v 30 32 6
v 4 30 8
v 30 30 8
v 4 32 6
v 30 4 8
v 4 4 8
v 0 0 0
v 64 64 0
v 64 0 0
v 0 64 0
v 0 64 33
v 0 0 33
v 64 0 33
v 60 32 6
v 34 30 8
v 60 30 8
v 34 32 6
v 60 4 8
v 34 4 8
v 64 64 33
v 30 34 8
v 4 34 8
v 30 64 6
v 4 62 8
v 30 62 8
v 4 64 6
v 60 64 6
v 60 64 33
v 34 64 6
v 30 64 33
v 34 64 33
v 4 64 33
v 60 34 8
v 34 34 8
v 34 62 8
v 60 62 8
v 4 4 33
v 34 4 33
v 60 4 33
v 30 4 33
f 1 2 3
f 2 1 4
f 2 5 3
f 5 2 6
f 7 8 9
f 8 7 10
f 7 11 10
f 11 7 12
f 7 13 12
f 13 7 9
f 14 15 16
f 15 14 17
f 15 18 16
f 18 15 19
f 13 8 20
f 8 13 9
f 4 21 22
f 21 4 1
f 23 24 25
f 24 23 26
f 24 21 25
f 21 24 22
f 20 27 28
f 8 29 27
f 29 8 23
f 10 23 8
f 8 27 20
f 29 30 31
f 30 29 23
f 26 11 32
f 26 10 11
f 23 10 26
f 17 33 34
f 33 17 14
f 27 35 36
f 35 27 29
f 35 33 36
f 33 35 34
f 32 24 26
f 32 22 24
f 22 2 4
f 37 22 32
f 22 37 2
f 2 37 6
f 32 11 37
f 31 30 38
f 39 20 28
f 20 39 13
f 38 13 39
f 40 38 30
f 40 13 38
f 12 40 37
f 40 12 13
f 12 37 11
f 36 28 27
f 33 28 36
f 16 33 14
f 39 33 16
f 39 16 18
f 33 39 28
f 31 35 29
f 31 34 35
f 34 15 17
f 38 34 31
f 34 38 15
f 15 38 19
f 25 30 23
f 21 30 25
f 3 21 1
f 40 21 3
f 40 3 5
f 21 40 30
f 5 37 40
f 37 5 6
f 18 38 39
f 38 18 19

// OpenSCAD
// file: WylochStyleDungeonLibrary.scad
size = 32;
baseheight = 6;
topperheight = 2;
topperrounded = true;
walllength = size;
wallheight = 25 + baseheight + topperheight;
wallwidth = 6;
wallwidththin = 4;

function hypotenuse_ra(side_a, side_b) =
    sqrt(pow(side_a, 2) + pow(side_b, 2));
    
module wsdl_Base(s,bh)
{
    cube([s,s,bh]);
}

module wsdl_Topper(s,bh,th,tr)
{
    if (tr) {
        translate([0,0,bh])
            intersection() {
                difference () {
                        cube([s,s,th]);
                        union () {
                        rotate(a=45, v=[1,0,0])
                            cube([s,th*2,th*2]);
                        translate([0,s,0])
                            rotate(a=45, v=[1,0,0])
                                cube([s,th*2,th*2]);
                        rotate(a=-45, v=[0,1,0])
                            cube([th*2,s,th*2]);
                        translate([s,0,0])
                            rotate(a=-45, v=[0,1,0])
                                cube([th*2,s,th*2]);
                        }
                }
                translate([s/2,s/2,0])
                    cylinder(
                        h=th, 
                        r1=hypotenuse_ra(s/2-1.2, s/2-1.2), 
                        r2=hypotenuse_ra(s/2-th-.8, s/2-th-.8), 
                        center=false, 
                        $fa=.1);
            }    
    }
    else {
        translate([0,0,bh])
            difference() {
                cube([s,s,th]);
                union () {
                rotate(a=45, v=[1,0,0])
                    cube([s,th*2,th*2]);
                translate([0,s,0])
                    rotate(a=45, v=[1,0,0])
                        cube([s,th*2,th*2]);
                rotate(a=-45, v=[0,1,0])
                    cube([th*2,s,th*2]);
                translate([s,0,0])
                    rotate(a=-45, v=[0,1,0])
                        cube([th*2,s,th*2]);
                }
            }    
    }
}

module wsdl_Base_1x1(s,bh,th,tr) 
{
    union () {
        wsdl_Base(s,bh);
        wsdl_Topper(s,bh,th,tr);
    }
}

module wsdl_Base_1x2(s,bh,th,tr)
{
    union () {
        wsdl_Base_1x1(s,bh,th,tr);
        translate([s,0,0])
            wsdl_Base_1x1(s,bh,th,tr);
    }
}
 
module wsdl_Base_2x2(s,bh,th,tr)
{
    union () {
        wsdl_Base_1x2(s,bh,th,tr);
        translate([0,s,0])
            wsdl_Base_1x2(s,bh,th,tr);
    }
}
 
module wsdl_Base_2x4(s,bh,th,tr)
{
    union () {
        wsdl_Base_2x2(s,bh,th,tr);
        translate([s*2,0,0])
            wsdl_Base_2x2(s,bh,th,tr);
    }
}
 
module wsdl_Base_4x4(s,bh,th,tr)
{
    union () {
        wsdl_Base_2x4(s,bh,th,tr);
        translate([0,s*2,0])
            wsdl_Base_2x4(s,bh,th,tr);
    }
}
 
module wsdl_Wall_1(w,l,h)
{
    cube([w,l,h]);   
}

module wsdl_Wall_2(w,l,h)
{
    union() {
        wsdl_Wall_1(w,l,h);
        translate([0,l,0])
            wsdl_Wall_1(w,l,h);
    }
}

module wsdl_Wall_1_Left(w,l,h) 
{
    wsdl_Wall_1(w,l,h);
}

module wsdl_Wall_1_Right(w,l,h) 
{
    translate([(size)-w,0,0])
        wsdl_Wall_1(w,l,h);
}

module wsdl_Wall_1_DoubleRight(w,l,h) 
{
    translate([(size*2)-w,0,0])
        wsdl_Wall_1(w,l,h);
}

module wsdl_Wall_1_Bottom(w,l,h) 
{
rotate(a=-90)
    translate([-w,0,0])
        wsdl_Wall_1(w,l,h);

}

module wsdl_Wall_1_Top(w,l,h) 
{
rotate(a=-90)
    translate([-l,0,0])
        wsdl_Wall_1(w,l,h);

}

module wsdl_Wall_1_Center(w,l,h) 
{
    translate([(size)-w/2,0,0])
        wsdl_Wall_1(w,l,h);
}


module wsdl_Wall_2_Left(w,l,h) 
{
    wsdl_Wall_2(w,l,h);
}

module wsdl_Wall_2_Right(w,l,h) 
{
    translate([(size*2)-w,0,0])
        wsdl_Wall_2(w,l,h);
}

module wsdl_Wall_2_Bottom(w,l,h) 
{
rotate(a=-90)
    translate([-w,0,0])
        wsdl_Wall_2(w,l,h);

}

module wsdl_Wall_2_Top(w,l,h) 
{
rotate(a=-90)
    translate([-l*2,0,0])
        wsdl_Wall_2(w,l,h);

}

module wsdl_Wall_2_Center(w,l,h) 
{
    translate([(size)-w/2,0,0])
        wsdl_Wall_2(w,l,h);
}
// main file
include <WylochStyleDungeonLibrary.scad>; 
 
wsdl_Base_2x2(size,baseheight,topperheight,topperrounded=false);
wsdl_Wall_2_Left(wallwidththin,walllength,wallheight);
wsdl_Wall_2_Right(wallwidththin,walllength,wallheight);
wsdl_Wall_2_Center(wallwidththin,walllength,wallheight);
wsdl_Wall_2_Bottom(wallwidththin,walllength,wallheight);
